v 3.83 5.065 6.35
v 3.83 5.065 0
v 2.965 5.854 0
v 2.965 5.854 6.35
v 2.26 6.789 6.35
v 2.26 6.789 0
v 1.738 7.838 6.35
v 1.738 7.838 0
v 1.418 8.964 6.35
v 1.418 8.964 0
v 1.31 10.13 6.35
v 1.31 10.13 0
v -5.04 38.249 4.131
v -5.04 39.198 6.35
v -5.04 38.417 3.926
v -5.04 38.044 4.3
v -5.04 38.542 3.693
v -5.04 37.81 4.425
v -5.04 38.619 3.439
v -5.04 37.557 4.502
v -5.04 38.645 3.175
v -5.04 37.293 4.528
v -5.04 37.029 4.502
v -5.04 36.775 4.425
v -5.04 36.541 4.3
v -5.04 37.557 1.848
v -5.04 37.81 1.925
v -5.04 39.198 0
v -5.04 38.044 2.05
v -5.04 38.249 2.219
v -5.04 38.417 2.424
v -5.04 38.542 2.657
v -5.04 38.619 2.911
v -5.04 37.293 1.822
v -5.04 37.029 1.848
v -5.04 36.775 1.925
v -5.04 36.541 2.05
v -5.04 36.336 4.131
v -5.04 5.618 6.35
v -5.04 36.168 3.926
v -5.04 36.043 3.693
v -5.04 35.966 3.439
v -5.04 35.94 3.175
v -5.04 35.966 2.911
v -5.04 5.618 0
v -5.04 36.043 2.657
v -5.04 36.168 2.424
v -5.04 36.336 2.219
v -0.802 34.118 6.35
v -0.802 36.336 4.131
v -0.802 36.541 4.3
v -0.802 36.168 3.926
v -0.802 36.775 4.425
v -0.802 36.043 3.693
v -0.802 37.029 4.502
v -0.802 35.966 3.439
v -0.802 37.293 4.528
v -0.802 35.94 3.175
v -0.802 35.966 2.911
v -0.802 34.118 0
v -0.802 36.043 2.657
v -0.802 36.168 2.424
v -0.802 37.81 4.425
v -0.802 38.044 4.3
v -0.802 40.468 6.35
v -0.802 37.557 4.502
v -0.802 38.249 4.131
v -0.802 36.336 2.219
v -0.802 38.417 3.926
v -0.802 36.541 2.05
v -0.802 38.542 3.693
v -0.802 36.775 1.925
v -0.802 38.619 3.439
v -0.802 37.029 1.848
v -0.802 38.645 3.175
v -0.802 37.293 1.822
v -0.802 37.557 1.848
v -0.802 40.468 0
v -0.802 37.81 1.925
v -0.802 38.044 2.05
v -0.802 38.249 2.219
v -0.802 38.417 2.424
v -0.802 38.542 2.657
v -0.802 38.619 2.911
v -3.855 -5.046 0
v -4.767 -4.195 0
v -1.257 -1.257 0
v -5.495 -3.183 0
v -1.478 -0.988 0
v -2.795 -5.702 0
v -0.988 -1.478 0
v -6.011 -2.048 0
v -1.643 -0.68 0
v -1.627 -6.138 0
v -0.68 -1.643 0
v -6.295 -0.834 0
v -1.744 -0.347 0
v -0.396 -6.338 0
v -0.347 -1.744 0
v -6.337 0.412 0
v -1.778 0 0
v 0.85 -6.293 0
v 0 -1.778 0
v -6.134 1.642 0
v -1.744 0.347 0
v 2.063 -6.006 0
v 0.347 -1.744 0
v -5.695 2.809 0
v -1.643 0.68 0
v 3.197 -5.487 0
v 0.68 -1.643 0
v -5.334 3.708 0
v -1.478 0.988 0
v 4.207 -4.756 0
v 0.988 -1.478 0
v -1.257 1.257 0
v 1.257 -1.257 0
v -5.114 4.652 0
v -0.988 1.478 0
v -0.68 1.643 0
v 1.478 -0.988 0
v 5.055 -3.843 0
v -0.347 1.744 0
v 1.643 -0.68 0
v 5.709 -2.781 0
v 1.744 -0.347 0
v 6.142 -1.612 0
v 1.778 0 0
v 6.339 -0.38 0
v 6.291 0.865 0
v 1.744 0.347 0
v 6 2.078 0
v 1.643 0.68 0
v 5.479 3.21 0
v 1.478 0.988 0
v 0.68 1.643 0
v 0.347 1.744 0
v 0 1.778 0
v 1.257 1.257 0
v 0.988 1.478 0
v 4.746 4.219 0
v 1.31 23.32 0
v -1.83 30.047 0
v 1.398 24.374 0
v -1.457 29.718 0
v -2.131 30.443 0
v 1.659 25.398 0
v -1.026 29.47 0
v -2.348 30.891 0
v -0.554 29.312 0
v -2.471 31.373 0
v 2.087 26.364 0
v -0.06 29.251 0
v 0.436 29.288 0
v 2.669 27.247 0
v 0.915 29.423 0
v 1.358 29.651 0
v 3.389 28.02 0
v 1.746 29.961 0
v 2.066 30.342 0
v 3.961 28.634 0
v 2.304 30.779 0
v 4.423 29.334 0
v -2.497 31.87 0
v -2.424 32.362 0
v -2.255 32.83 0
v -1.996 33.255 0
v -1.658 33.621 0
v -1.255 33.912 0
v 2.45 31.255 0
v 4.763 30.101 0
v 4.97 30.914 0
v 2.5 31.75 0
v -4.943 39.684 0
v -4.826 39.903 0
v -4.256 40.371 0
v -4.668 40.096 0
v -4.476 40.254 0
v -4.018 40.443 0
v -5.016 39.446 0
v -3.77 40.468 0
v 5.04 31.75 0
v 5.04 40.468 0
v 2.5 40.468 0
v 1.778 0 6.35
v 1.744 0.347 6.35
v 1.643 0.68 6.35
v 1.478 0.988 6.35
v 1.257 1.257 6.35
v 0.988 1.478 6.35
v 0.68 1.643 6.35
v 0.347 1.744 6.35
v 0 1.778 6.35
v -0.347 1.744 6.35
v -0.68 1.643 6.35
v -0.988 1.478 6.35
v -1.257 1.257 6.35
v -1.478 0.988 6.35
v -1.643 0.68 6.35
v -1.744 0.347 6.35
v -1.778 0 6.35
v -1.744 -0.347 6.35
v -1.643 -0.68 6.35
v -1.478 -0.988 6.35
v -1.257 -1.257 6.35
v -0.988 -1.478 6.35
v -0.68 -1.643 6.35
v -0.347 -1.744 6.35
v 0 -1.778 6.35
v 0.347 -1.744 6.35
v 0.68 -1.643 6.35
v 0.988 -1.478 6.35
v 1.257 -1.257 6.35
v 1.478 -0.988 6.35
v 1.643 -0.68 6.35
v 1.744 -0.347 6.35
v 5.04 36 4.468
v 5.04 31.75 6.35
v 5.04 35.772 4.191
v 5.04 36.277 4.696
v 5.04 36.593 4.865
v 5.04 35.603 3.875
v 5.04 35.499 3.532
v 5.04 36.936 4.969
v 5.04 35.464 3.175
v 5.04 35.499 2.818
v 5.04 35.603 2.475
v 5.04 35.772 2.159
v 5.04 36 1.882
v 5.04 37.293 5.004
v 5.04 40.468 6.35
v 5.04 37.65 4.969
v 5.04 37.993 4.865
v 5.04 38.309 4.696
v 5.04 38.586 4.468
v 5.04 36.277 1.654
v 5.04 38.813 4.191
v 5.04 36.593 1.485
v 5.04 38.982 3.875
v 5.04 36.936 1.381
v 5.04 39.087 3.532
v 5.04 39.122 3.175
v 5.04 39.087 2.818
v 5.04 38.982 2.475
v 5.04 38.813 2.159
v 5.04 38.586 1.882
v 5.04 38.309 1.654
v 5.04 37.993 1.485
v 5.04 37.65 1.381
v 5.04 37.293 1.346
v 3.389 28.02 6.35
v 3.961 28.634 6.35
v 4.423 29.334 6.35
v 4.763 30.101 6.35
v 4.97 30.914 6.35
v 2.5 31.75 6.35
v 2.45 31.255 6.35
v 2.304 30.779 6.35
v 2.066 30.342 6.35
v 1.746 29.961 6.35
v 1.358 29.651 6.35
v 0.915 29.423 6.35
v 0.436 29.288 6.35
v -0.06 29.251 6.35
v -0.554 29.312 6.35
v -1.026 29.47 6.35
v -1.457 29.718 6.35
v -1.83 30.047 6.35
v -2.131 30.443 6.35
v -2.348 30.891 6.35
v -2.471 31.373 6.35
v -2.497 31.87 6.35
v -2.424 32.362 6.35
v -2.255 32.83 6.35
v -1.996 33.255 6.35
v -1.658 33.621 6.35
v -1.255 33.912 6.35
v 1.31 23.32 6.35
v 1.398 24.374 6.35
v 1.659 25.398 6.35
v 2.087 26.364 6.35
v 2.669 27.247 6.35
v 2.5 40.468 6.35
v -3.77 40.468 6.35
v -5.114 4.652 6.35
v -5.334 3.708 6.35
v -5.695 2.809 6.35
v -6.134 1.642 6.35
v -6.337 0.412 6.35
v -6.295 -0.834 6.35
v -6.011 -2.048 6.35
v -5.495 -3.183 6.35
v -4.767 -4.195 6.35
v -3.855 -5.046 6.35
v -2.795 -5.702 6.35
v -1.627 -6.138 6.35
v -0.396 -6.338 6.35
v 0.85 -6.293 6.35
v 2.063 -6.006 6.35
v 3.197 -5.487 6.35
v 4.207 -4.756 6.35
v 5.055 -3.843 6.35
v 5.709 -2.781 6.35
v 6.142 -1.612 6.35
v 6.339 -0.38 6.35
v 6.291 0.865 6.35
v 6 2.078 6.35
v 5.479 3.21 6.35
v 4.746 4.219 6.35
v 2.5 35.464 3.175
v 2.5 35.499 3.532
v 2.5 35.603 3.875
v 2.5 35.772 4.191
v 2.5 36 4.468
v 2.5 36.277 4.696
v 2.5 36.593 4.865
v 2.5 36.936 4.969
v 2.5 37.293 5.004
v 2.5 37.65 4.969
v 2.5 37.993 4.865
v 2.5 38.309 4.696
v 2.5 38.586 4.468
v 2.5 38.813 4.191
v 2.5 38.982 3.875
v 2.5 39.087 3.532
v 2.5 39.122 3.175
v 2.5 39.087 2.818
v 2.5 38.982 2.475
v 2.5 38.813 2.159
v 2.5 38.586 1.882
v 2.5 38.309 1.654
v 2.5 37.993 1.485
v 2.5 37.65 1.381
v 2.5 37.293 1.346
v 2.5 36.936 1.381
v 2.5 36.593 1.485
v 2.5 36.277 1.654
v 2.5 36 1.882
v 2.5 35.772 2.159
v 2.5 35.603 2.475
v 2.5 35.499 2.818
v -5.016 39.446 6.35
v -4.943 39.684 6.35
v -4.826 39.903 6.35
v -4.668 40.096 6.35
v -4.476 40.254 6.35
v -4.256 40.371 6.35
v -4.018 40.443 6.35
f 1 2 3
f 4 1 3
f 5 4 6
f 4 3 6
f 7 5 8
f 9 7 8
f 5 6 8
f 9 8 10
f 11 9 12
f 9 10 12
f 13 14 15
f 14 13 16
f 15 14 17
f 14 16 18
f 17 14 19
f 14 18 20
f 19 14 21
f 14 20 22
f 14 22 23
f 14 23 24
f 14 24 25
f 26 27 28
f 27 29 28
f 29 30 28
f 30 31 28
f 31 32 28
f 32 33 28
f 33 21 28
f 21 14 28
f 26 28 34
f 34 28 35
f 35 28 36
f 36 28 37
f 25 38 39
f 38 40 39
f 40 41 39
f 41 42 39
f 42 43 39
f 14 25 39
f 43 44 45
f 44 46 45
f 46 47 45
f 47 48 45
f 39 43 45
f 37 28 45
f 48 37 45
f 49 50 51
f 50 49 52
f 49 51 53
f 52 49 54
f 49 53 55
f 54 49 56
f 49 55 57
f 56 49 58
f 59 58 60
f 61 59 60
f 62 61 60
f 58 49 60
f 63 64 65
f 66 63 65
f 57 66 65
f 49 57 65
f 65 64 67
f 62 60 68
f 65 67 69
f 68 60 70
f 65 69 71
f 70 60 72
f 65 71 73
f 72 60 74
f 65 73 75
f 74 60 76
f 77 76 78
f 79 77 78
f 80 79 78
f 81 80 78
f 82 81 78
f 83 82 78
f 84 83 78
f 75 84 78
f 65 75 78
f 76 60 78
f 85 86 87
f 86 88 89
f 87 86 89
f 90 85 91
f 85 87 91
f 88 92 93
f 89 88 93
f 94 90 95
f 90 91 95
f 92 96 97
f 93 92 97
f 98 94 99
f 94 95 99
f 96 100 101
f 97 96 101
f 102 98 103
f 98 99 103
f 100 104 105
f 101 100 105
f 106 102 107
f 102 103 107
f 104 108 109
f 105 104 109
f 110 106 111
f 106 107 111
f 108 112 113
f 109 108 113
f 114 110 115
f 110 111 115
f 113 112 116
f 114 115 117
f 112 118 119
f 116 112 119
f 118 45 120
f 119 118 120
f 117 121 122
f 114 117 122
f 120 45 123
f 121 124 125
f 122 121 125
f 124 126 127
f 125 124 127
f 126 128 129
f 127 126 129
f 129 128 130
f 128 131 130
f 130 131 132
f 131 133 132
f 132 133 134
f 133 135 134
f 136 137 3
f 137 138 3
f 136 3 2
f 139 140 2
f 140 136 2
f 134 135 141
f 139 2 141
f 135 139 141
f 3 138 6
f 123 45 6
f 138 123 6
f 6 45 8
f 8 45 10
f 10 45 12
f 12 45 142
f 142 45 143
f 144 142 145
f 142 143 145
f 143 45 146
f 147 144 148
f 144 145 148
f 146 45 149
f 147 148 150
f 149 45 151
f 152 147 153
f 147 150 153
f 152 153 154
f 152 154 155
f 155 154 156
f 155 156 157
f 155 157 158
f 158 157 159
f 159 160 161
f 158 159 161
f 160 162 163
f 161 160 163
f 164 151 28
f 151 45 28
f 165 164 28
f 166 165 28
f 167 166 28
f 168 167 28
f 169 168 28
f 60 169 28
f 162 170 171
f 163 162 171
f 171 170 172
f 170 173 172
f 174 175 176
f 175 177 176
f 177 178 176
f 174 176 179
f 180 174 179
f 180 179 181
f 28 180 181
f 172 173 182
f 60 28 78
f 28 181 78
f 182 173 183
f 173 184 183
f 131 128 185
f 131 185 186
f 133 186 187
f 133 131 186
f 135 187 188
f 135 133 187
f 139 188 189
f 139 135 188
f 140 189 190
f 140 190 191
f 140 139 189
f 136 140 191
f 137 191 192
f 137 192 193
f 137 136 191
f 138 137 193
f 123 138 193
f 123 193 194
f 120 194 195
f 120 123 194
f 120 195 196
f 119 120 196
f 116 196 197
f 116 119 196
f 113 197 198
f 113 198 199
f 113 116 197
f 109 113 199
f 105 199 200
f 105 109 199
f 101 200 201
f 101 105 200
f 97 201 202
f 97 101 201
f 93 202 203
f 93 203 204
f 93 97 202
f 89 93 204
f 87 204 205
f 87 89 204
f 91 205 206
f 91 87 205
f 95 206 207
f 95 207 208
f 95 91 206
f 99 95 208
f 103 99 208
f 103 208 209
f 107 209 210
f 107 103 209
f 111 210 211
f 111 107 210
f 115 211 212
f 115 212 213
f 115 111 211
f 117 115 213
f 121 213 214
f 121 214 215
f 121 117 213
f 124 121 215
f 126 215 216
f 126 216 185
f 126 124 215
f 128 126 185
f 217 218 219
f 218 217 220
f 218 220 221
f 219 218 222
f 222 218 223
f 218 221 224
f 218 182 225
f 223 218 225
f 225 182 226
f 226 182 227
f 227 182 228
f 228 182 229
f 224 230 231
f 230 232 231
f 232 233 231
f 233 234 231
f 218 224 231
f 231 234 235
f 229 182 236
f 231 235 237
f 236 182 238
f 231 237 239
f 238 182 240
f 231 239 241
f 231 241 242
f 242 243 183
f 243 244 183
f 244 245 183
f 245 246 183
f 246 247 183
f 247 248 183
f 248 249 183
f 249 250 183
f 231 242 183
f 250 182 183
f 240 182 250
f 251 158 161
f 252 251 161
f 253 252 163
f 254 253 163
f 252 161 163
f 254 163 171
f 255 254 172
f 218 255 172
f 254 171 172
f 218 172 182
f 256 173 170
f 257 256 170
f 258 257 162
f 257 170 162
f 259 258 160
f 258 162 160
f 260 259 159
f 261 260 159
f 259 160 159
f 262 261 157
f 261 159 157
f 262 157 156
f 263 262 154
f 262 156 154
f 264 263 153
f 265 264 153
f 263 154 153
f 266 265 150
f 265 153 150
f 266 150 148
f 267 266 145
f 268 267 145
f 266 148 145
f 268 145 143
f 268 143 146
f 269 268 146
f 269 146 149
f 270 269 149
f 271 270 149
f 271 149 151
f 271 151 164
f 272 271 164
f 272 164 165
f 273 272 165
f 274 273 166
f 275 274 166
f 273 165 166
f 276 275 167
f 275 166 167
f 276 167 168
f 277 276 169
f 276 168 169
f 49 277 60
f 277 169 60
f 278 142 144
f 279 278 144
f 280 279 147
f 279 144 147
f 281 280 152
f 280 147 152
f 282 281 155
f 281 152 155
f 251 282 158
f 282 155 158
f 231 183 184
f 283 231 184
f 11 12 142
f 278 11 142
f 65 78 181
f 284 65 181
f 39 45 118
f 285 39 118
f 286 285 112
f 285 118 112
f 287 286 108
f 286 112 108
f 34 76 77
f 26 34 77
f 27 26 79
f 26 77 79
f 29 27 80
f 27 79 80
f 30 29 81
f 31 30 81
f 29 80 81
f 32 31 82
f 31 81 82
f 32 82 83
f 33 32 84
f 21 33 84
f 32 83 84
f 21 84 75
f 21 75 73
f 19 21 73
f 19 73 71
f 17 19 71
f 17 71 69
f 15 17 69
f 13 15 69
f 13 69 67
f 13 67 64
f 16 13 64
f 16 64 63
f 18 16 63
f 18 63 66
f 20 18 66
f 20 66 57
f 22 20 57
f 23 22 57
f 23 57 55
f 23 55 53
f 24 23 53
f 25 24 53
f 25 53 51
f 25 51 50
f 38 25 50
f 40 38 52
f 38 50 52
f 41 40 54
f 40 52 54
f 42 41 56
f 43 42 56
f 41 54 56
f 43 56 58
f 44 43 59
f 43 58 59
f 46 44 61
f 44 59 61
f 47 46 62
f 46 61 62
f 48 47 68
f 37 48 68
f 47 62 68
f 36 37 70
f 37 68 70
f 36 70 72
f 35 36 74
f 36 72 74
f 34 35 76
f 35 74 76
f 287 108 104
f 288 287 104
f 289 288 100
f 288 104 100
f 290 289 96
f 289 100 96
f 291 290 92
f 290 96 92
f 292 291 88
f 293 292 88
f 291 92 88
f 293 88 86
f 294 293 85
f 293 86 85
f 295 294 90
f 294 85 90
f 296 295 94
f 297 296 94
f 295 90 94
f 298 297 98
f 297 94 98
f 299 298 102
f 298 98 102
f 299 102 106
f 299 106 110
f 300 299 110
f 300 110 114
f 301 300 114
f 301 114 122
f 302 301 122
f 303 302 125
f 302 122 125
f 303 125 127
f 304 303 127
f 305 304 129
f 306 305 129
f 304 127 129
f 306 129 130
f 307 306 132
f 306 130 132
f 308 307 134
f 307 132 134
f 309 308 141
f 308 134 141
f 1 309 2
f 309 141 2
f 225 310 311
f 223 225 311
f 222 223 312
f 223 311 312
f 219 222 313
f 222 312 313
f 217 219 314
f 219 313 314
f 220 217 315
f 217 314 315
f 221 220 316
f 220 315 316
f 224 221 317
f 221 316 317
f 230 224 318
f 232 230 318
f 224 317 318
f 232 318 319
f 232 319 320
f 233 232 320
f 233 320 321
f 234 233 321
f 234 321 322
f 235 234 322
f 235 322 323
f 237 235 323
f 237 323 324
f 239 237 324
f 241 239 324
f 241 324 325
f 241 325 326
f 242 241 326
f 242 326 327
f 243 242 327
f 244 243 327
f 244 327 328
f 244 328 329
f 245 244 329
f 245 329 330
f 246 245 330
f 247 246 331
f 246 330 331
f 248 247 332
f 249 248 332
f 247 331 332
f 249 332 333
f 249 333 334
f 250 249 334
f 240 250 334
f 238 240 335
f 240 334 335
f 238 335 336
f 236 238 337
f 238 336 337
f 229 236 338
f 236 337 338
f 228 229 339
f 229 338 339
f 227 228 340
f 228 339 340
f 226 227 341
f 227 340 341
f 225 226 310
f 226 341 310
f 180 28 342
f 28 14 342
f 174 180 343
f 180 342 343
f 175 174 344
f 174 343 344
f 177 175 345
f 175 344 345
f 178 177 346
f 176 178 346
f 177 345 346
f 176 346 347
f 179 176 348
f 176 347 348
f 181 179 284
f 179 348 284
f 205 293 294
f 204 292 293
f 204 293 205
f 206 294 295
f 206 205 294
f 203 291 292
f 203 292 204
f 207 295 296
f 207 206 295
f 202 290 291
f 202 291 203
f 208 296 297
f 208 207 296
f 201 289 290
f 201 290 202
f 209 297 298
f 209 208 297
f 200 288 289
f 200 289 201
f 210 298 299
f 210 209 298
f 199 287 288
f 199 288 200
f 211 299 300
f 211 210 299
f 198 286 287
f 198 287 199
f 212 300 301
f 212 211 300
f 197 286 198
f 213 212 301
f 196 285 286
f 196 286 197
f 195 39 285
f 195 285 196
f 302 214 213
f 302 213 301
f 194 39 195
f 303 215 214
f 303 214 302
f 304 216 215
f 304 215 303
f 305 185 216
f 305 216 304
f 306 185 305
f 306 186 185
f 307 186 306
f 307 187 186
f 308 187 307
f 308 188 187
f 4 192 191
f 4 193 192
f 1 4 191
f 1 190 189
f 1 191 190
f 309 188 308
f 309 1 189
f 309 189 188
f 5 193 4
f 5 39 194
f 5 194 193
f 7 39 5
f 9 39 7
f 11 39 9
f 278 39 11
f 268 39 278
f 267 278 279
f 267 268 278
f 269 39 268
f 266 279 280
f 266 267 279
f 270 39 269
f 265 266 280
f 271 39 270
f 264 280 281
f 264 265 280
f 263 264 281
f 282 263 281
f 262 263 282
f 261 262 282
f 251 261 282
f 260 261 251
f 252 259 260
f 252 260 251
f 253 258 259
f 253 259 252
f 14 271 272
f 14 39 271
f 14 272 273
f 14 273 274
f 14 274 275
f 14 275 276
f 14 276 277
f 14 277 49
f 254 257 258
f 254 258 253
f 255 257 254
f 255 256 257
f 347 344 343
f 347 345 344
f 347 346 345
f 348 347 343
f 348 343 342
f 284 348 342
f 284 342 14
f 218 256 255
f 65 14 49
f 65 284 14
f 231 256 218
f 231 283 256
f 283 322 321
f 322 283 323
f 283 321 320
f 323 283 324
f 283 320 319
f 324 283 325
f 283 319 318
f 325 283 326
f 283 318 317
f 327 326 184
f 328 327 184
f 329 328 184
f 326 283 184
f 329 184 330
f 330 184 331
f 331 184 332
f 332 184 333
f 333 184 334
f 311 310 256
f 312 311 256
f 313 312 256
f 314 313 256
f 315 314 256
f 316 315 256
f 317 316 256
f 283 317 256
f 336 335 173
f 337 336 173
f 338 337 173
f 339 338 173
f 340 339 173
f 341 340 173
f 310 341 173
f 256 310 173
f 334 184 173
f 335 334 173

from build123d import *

# Parameters (mm, degrees)
SKETCH1_R                 = 1.778
BOSS_EXTRUDE1_DEPTH       = 6.35
FILLET1_R                 = 1.27
F_6_32_TAPPED_HOLE1_D     = 2.7051
F_6_CLEARANCE_HOLE1_D     = 3.6576
F_6_CLEARANCE_HOLE1_DEPTH = 3.175
F_6_CLEARANCE_HOLE1_TIP   = 1.0988539


with BuildPart() as part:
    # Sketch1 → Boss-Extrude1 (new body)
    with BuildSketch(Plane.XY):
        with BuildLine():
            Line((-5.04, 40.467867395), (-5.04, 31.75))
            Line((-5.04, 31.75), (-5.04, 5.617641854))
            ThreePointArc((-5.04, 5.617641854), (-5.205917611, 4.175551358), (-5.695, 2.808820927))
            ThreePointArc((-5.695, 2.808820927), (1.46358213, -6.179031263), (3.83, 5.064938302))
            ThreePointArc((3.83, 5.064938302), (1.974799916, 7.301272707), (1.31, 10.129876603))
            Line((1.31, 10.129876603), (1.31, 23.320498235))
            ThreePointArc((1.31, 23.320498235), (1.853099889, 25.890013969), (3.389499561, 28.020000975))
            ThreePointArc((3.389499561, 28.020000975), (4.60894119, 29.710573339), (5.04, 31.75))
            Line((5.04, 31.75), (5.04, 40.467867395))
            Line((5.04, 40.467867395), (2.5, 40.467867395))
            Line((2.5, 40.467867395), (2.5, 31.75))
            ThreePointArc((2.5, 31.75), (-1.456880228, 29.718375035), (-0.802, 34.117867395))
            Line((-0.802, 34.117867395), (-0.802, 40.467867395))
            Line((-0.802, 40.467867395), (-5.04, 40.467867395))
        make_face()
        Circle(SKETCH1_R, mode=Mode.SUBTRACT)
    extrude(amount=BOSS_EXTRUDE1_DEPTH)

    # Fillet1
    fillet1_edges = [part.edges().sort_by_distance(p)[0] for p in [
        (-5.04, 40.467867395, 3.175),
    ]]
    fillet(fillet1_edges, radius=FILLET1_R)

    # #6-32 Tapped Hole1 (through all)
    with Locations(Plane.ZY.offset(5.04)):
        with Locations((3.175, 37.292867395)):
            Hole(F_6_32_TAPPED_HOLE1_D / 2)

    # #6 Clearance Hole1
    with Locations(Plane(origin=(5.04, 37.292867395, 3.175), x_dir=(0, 1, 0), z_dir=(1, 0, 0))):
        with Locations((0, 0)):
            Hole(F_6_CLEARANCE_HOLE1_D / 2, depth=F_6_CLEARANCE_HOLE1_DEPTH)
            with Locations((0, 0, -(F_6_CLEARANCE_HOLE1_DEPTH + F_6_CLEARANCE_HOLE1_TIP / 2))):  # 118° drill point
                Cone(0, F_6_CLEARANCE_HOLE1_D / 2, F_6_CLEARANCE_HOLE1_TIP, mode=Mode.SUBTRACT)


solid = part.part
